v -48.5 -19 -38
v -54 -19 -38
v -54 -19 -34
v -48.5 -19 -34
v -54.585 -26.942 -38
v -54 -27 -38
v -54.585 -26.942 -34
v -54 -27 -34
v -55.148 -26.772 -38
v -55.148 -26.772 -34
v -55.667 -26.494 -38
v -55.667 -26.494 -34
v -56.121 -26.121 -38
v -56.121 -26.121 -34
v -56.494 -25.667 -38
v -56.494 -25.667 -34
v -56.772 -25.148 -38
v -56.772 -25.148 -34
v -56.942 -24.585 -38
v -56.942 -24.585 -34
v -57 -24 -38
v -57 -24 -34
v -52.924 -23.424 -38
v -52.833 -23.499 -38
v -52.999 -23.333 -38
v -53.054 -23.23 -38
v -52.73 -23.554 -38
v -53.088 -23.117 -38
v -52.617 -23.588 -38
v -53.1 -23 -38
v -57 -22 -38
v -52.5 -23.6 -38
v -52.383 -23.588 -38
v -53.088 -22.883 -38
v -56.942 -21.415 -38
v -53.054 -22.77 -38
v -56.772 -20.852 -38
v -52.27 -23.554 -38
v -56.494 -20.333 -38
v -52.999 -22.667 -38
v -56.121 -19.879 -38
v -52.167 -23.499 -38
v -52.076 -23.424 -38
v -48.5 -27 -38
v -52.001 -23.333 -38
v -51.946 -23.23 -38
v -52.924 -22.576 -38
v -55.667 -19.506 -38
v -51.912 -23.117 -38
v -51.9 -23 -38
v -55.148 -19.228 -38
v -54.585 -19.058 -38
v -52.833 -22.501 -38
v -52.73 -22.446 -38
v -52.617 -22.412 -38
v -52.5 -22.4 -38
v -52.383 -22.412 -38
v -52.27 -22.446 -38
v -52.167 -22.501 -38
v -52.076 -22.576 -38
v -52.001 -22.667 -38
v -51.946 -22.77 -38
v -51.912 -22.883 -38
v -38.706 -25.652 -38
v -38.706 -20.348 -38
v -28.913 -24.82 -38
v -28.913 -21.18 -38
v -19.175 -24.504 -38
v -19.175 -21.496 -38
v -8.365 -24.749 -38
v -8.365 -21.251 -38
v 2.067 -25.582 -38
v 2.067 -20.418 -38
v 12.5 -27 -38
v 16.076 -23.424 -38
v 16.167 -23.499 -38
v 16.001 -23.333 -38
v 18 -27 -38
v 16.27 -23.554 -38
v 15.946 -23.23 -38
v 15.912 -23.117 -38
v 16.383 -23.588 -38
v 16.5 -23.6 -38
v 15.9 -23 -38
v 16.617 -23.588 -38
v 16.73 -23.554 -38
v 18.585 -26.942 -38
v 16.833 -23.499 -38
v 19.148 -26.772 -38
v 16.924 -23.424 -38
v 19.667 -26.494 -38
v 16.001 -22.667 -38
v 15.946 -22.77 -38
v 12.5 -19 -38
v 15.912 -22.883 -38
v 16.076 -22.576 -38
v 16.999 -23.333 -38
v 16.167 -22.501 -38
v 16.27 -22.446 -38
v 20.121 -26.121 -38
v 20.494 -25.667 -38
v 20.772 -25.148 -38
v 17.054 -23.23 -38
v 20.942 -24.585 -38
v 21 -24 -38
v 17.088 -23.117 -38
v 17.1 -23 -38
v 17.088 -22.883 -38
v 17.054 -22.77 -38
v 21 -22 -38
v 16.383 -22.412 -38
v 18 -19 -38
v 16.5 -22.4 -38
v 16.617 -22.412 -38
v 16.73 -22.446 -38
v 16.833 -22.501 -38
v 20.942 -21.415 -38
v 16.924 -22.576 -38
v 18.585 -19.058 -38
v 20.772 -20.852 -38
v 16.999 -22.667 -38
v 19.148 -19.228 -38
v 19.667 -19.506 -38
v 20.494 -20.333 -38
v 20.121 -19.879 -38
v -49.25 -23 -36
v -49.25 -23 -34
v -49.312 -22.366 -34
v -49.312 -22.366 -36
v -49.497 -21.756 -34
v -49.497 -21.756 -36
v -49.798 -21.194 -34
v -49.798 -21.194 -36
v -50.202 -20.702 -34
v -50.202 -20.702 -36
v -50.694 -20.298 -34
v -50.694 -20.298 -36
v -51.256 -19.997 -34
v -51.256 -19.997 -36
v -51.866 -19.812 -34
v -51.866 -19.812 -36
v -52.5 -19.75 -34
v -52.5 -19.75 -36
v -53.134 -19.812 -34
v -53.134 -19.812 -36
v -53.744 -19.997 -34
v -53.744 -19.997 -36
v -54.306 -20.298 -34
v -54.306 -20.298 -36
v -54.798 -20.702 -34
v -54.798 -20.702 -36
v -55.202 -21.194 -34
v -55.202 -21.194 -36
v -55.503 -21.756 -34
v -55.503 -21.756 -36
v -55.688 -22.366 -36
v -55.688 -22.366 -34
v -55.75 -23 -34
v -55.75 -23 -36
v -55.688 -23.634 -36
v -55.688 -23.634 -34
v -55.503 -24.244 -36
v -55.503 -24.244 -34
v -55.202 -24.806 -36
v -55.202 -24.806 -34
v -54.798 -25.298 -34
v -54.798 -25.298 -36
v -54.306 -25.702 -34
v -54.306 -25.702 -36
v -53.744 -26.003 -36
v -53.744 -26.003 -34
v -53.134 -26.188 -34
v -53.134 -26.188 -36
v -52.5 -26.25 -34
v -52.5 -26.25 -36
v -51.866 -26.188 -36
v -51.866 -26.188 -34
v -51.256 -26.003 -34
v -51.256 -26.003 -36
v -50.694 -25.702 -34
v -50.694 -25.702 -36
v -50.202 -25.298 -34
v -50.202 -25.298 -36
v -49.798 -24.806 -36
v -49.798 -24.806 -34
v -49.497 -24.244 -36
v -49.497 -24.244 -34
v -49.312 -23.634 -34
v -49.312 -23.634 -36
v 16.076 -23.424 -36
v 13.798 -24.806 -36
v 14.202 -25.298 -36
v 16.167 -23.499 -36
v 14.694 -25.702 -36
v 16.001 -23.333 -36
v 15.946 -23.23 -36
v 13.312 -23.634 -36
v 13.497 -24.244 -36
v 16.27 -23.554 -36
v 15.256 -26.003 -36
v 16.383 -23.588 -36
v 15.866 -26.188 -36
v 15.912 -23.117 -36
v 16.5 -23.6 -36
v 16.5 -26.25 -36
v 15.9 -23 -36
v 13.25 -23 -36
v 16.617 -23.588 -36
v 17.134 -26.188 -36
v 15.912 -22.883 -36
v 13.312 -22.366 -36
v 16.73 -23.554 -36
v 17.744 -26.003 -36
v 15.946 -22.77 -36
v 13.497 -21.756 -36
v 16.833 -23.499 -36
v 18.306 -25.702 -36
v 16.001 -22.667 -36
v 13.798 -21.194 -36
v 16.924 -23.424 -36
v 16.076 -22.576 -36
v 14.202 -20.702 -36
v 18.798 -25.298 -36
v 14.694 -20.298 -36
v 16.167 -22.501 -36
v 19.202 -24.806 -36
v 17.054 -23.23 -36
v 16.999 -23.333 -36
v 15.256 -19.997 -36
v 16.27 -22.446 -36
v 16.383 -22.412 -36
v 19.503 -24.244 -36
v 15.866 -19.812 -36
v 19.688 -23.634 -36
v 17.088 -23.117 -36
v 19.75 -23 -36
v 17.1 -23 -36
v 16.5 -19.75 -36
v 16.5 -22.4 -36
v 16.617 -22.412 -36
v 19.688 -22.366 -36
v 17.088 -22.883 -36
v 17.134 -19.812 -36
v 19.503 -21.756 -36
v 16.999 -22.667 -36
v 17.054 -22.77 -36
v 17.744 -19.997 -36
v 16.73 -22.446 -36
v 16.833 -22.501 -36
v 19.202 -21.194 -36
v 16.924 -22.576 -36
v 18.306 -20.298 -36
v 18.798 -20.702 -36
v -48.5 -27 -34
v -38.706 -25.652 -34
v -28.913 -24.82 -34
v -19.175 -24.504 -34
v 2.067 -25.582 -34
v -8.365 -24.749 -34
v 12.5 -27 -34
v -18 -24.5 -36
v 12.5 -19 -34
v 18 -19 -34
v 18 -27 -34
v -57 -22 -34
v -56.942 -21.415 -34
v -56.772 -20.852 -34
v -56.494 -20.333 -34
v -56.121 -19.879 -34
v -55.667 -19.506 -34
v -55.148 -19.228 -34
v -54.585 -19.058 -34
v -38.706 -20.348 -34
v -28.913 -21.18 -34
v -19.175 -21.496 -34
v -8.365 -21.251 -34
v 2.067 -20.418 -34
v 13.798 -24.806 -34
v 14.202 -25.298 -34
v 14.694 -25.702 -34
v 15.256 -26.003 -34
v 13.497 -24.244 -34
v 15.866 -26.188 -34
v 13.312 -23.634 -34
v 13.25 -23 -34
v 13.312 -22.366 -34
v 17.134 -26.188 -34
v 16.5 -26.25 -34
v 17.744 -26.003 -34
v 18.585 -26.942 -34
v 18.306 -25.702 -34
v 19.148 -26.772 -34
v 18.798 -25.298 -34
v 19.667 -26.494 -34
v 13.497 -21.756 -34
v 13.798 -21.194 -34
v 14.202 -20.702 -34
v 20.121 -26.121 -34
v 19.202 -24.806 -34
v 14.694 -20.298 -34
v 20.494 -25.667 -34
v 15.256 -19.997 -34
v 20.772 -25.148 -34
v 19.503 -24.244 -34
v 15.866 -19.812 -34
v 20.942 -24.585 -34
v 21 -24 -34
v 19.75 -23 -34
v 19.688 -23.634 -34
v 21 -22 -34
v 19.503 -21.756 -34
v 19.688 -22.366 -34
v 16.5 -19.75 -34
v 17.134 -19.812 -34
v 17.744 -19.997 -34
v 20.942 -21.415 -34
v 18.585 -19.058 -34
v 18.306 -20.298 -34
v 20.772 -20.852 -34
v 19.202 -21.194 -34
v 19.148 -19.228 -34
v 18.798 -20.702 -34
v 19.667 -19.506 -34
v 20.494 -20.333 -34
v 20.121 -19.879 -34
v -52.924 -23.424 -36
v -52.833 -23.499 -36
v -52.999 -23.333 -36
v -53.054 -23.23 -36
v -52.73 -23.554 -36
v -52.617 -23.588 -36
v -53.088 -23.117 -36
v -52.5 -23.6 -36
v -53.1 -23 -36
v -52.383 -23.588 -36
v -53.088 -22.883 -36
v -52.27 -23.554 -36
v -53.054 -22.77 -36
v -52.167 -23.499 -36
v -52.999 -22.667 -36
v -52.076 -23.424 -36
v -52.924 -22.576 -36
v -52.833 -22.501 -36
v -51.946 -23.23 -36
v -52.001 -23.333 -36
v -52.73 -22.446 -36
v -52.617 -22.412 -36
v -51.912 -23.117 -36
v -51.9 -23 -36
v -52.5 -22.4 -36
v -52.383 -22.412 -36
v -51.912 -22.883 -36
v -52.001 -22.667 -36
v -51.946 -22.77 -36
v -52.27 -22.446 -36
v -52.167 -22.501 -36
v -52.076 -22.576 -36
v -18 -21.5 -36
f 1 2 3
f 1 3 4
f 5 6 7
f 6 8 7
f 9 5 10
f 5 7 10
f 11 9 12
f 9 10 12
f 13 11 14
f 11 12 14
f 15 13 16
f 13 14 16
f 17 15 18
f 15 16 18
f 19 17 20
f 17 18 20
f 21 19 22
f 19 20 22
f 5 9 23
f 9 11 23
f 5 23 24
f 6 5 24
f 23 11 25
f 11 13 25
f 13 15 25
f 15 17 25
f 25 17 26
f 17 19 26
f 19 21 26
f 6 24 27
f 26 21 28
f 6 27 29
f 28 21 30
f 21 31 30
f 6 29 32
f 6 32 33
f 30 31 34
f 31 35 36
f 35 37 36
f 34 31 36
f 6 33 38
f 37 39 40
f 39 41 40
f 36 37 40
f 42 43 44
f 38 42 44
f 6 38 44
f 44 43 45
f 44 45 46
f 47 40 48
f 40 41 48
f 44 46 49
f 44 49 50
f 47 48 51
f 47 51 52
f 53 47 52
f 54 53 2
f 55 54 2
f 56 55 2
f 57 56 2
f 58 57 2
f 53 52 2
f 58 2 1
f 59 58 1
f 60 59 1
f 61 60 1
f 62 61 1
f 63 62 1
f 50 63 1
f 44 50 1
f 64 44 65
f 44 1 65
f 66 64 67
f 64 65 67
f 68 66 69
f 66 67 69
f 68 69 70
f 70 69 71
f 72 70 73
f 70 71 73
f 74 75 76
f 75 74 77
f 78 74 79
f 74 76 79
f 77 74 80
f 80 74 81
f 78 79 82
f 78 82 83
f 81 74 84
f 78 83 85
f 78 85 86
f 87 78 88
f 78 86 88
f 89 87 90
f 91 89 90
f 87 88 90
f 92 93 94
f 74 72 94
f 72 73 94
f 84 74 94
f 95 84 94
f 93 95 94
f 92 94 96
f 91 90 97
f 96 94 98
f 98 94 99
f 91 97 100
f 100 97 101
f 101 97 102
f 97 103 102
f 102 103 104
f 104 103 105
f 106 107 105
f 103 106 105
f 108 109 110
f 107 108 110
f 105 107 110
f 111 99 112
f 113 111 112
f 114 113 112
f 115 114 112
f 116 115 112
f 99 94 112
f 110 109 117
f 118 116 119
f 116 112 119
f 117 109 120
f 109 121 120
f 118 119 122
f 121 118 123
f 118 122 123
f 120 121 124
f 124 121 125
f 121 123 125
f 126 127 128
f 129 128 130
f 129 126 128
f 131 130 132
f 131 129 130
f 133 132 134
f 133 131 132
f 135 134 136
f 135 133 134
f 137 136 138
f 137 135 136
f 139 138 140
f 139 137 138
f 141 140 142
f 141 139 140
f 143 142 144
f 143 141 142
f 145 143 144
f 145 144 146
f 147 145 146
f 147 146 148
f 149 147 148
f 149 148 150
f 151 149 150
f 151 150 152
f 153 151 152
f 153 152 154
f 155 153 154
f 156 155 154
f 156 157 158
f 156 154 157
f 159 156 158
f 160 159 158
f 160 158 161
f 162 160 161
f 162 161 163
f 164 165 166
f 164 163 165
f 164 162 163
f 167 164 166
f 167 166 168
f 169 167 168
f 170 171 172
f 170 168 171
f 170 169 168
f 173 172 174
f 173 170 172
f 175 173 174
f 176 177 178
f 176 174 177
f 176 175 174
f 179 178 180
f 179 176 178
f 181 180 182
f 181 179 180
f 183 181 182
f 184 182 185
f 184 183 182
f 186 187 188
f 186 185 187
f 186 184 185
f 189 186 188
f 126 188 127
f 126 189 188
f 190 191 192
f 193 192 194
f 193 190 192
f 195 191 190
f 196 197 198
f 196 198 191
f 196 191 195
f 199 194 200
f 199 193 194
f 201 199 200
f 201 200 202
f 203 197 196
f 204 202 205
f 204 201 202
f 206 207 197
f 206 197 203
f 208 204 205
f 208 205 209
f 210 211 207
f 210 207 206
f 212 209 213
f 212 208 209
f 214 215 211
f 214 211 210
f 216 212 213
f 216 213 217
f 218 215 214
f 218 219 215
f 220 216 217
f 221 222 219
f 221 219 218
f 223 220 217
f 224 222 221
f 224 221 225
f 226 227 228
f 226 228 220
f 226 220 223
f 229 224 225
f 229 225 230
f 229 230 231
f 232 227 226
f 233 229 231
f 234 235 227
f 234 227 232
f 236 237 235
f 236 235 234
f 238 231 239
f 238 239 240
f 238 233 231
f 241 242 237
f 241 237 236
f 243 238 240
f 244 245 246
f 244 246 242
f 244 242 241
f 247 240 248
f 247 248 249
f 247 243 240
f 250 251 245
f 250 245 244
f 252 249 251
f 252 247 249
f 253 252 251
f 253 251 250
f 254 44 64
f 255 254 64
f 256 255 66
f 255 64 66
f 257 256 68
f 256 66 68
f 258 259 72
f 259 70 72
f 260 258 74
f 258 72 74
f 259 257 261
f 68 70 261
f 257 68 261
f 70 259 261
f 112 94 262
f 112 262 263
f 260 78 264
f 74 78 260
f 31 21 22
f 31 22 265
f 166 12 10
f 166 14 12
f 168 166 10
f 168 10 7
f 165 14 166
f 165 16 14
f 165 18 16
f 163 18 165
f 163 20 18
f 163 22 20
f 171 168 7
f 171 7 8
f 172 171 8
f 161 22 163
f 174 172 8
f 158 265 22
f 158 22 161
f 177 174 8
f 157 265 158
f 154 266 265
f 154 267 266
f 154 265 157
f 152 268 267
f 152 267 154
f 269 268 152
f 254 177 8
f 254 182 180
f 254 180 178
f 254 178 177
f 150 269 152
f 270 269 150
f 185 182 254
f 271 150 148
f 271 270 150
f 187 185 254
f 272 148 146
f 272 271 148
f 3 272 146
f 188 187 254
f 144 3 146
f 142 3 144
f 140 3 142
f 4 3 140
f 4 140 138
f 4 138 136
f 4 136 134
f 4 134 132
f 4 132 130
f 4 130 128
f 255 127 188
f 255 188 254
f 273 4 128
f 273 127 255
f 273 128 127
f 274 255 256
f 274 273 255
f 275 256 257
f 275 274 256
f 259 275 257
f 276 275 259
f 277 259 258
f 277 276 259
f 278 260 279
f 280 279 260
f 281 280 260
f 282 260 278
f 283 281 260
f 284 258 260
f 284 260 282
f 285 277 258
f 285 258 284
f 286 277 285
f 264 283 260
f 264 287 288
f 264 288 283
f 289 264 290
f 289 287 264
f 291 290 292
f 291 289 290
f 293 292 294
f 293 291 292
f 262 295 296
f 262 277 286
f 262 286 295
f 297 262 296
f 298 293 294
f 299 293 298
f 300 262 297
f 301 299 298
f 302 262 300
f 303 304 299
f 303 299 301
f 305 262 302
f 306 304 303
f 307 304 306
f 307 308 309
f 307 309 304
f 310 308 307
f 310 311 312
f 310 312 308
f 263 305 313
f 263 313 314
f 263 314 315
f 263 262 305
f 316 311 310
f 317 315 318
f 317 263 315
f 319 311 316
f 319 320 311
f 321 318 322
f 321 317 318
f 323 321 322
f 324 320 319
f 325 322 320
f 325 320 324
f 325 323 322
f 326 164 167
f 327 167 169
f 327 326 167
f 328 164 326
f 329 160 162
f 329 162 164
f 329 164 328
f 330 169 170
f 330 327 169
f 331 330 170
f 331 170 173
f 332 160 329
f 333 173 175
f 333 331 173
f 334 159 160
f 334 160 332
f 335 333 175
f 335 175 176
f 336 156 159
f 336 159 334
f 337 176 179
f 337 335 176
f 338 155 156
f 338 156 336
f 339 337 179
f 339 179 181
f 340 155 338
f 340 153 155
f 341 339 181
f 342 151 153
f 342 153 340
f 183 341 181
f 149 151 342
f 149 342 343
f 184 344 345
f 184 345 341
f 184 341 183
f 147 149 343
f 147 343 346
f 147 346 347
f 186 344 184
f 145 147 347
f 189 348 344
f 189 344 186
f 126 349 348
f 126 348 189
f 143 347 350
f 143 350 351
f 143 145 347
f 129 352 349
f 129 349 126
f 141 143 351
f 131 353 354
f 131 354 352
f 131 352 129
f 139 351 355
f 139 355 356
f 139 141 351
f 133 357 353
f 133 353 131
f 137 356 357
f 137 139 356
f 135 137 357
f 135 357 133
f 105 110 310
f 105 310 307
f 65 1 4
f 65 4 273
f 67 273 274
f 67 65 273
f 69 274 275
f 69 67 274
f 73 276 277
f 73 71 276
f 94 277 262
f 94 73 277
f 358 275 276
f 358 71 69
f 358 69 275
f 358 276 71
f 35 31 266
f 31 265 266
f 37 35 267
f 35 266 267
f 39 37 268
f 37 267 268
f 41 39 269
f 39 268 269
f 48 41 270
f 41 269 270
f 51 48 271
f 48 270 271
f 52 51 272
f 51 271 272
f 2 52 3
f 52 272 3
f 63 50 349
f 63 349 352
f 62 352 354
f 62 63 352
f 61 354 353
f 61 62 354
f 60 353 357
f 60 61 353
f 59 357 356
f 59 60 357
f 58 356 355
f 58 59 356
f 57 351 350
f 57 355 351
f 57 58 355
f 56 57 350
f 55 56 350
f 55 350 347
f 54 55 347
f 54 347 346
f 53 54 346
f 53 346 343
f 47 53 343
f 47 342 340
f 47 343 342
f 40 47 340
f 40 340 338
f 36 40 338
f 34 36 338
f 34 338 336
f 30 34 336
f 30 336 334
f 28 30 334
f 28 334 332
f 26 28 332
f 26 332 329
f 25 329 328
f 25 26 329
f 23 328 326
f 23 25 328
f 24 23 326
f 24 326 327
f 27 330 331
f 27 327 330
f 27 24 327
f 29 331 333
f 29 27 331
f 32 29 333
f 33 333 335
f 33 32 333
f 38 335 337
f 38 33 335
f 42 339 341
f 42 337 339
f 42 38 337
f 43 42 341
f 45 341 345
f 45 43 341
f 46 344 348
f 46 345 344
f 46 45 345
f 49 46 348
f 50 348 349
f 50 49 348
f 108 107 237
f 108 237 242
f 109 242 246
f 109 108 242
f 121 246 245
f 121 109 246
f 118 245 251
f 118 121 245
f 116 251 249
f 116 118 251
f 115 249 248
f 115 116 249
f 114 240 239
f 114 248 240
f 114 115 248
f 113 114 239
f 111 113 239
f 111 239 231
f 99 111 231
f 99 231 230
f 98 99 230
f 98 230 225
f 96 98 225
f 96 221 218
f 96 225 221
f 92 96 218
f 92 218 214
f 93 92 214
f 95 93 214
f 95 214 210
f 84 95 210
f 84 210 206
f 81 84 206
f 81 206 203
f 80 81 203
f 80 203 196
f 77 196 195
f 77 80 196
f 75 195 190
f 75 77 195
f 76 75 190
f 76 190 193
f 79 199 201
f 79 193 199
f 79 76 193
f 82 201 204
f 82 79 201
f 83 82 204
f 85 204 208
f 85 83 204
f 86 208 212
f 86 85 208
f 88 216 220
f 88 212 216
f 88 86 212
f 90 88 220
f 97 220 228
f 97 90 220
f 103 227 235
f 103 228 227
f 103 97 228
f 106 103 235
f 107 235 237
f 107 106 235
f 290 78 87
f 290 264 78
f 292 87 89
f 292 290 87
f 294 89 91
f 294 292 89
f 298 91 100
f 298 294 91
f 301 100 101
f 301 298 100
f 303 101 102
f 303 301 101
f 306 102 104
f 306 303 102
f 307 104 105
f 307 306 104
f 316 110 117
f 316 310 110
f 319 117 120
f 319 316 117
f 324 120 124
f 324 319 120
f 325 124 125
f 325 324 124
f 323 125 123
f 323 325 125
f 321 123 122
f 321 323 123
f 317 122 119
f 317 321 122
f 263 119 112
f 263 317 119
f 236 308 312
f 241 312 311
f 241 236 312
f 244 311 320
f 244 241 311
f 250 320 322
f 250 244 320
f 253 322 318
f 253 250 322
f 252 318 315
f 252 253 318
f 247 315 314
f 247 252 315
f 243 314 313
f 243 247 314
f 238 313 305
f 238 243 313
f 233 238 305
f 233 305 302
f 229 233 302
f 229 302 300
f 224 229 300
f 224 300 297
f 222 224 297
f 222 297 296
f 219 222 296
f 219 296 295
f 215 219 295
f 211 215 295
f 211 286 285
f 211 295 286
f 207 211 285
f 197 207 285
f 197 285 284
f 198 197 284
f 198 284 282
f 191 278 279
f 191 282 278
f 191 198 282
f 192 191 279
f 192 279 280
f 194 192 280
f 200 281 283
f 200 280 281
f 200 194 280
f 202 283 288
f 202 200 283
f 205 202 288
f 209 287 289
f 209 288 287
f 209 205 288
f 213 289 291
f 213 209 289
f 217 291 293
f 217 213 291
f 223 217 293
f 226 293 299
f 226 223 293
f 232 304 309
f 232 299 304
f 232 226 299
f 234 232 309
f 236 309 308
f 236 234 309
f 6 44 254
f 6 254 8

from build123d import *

# Parameters (mm, degrees)
CYLINDER134_R     = 3.25
CYLINDER134_DEPTH = 3.5
CYLINDER136_R     = 0.6
CYLINDER136_DEPTH = 9.5
CYLINDER135_R     = 0.6
CYLINDER135_DEPTH = 9.5
CYLINDER133_R     = 3.25
CYLINDER133_DEPTH = 3.5
PAD012_DEPTH      = 4
FILLET076_R       = 3


with BuildPart() as zylinder134:
    # Cylinder134 → Cylinder134 (new body)
    with BuildSketch(Plane(origin=(-52.5, 23, -36), x_dir=(1, 0, 0), z_dir=(0, 0, 1))):
        Circle(CYLINDER134_R)
    extrude(amount=CYLINDER134_DEPTH)


with BuildPart() as zylinder136:
    # Cylinder136 → Cylinder136 (new body)
    with BuildSketch(Plane(origin=(16.5, 23, -39), x_dir=(1, 0, 0), z_dir=(0, 0, 1))):
        Circle(CYLINDER136_R)
    extrude(amount=CYLINDER136_DEPTH)


with BuildPart() as zylinder135:
    # Cylinder135 → Cylinder135 (new body)
    with BuildSketch(Plane(origin=(-52.5, 23, -39), x_dir=(1, 0, 0), z_dir=(0, 0, 1))):
        Circle(CYLINDER135_R)
    extrude(amount=CYLINDER135_DEPTH)


with BuildPart() as fusion087:
    # Cylinder133 → Cylinder133 (new body)
    with BuildSketch(Plane(origin=(16.5, 23, -36), x_dir=(1, 0, 0), z_dir=(0, 0, 1))):
        Circle(CYLINDER133_R)
    extrude(amount=CYLINDER133_DEPTH)

    # Fusion087: union Zylinder134, Zylinder136, Zylinder135
    add(zylinder134.part)
    add(zylinder136.part)
    add(zylinder135.part)


with BuildPart() as fillet076:
    # Sketch012 → Pad012 (new body)
    with BuildSketch(Plane.XY):
        with BuildLine():
            add(Edge.make_bspline(
                [(-48.5, 19), (-18, 24), (12.5, 19)],
                knots=[0, 0, 0, 1, 1, 1], degree=2))
            Line((-48.5, 19), (-57, 19))
            Line((-57, 19), (-57, 27))
            Line((-57, 27), (-48.5, 27))
            add(Edge.make_bspline(
                [(-48.5, 27), (-18, 22), (12.5, 27)],
                knots=[0, 0, 0, 1, 1, 1], degree=2))
            Line((12.5, 27), (21, 27))
            Line((21, 27), (21, 19))
            Line((21, 19), (12.5, 19))
        make_face()
    extrude(amount=PAD012_DEPTH)


with BuildPart() as fillet076_1:
    # Body003 placement: moved
    add(fillet076.part.moved(Location((0, 0, -38))))

    # Cut065: cut Fusion087
    add(fusion087.part, mode=Mode.SUBTRACT)

    # Fillet076
    fillet076_edges = [fillet076_1.edges().sort_by_distance(p)[0] for p in [
        (-57, 19, -36),
        (21, 19, -36),
        (-57, 27, -36),
        (21, 27, -36),
    ]]
    fillet(fillet076_edges, radius=FILLET076_R)


with BuildPart() as fillet076_2:
    # Fillet076 placement: moved
    add(fillet076_1.part.moved(Location((0, -46, 0))))


solid = fillet076_2.part
